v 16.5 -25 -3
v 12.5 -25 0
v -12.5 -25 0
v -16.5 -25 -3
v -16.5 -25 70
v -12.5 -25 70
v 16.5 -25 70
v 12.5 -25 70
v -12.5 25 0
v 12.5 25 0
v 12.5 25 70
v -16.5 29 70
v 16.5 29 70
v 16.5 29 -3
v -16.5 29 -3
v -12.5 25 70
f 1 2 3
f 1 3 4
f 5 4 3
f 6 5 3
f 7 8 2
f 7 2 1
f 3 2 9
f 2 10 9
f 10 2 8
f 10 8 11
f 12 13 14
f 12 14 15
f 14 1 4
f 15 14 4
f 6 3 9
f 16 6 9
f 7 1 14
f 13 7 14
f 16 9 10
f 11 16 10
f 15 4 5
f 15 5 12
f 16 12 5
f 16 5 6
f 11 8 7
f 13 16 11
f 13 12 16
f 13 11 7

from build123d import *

# Parameters (mm, degrees)
CROQUIS1_W              = 33
CROQUIS1_H              = 58
CROQUIS1_W_2            = 25
CROQUIS1_H_2            = 50
SALIENTE_EXTRUIR1_DEPTH = 70
CROQUIS2_W              = 33
CROQUIS2_H              = 58
SALIENTE_EXTRUIR2_DEPTH = 3
CROQUIS3_W              = 33
CROQUIS3_H              = 4
CORTAR_EXTRUIR1_DEPTH   = 81.263628126


with BuildPart() as part:
    # Croquis1 → Saliente-Extruir1 (new body)
    with BuildSketch(Plane.XY):
        Rectangle(CROQUIS1_W, CROQUIS1_H)
        Rectangle(CROQUIS1_W_2, CROQUIS1_H_2, mode=Mode.SUBTRACT)
    extrude(amount=SALIENTE_EXTRUIR1_DEPTH)

    # Croquis2 → Saliente-Extruir2 (add)
    with BuildSketch(Plane(origin=(0, 0, 0), x_dir=(-1, 0, 0), z_dir=(0, 0, -1))):
        Rectangle(CROQUIS2_W, CROQUIS2_H)
    extrude(amount=SALIENTE_EXTRUIR2_DEPTH)

    # Croquis3 → Cortar-Extruir1 (cut, through all)
    with BuildSketch(Plane.XY.offset(70)):
        with Locations((0, -27)):
            Rectangle(CROQUIS3_W, CROQUIS3_H)
    extrude(amount=-CORTAR_EXTRUIR1_DEPTH, mode=Mode.SUBTRACT)


solid = part.part
